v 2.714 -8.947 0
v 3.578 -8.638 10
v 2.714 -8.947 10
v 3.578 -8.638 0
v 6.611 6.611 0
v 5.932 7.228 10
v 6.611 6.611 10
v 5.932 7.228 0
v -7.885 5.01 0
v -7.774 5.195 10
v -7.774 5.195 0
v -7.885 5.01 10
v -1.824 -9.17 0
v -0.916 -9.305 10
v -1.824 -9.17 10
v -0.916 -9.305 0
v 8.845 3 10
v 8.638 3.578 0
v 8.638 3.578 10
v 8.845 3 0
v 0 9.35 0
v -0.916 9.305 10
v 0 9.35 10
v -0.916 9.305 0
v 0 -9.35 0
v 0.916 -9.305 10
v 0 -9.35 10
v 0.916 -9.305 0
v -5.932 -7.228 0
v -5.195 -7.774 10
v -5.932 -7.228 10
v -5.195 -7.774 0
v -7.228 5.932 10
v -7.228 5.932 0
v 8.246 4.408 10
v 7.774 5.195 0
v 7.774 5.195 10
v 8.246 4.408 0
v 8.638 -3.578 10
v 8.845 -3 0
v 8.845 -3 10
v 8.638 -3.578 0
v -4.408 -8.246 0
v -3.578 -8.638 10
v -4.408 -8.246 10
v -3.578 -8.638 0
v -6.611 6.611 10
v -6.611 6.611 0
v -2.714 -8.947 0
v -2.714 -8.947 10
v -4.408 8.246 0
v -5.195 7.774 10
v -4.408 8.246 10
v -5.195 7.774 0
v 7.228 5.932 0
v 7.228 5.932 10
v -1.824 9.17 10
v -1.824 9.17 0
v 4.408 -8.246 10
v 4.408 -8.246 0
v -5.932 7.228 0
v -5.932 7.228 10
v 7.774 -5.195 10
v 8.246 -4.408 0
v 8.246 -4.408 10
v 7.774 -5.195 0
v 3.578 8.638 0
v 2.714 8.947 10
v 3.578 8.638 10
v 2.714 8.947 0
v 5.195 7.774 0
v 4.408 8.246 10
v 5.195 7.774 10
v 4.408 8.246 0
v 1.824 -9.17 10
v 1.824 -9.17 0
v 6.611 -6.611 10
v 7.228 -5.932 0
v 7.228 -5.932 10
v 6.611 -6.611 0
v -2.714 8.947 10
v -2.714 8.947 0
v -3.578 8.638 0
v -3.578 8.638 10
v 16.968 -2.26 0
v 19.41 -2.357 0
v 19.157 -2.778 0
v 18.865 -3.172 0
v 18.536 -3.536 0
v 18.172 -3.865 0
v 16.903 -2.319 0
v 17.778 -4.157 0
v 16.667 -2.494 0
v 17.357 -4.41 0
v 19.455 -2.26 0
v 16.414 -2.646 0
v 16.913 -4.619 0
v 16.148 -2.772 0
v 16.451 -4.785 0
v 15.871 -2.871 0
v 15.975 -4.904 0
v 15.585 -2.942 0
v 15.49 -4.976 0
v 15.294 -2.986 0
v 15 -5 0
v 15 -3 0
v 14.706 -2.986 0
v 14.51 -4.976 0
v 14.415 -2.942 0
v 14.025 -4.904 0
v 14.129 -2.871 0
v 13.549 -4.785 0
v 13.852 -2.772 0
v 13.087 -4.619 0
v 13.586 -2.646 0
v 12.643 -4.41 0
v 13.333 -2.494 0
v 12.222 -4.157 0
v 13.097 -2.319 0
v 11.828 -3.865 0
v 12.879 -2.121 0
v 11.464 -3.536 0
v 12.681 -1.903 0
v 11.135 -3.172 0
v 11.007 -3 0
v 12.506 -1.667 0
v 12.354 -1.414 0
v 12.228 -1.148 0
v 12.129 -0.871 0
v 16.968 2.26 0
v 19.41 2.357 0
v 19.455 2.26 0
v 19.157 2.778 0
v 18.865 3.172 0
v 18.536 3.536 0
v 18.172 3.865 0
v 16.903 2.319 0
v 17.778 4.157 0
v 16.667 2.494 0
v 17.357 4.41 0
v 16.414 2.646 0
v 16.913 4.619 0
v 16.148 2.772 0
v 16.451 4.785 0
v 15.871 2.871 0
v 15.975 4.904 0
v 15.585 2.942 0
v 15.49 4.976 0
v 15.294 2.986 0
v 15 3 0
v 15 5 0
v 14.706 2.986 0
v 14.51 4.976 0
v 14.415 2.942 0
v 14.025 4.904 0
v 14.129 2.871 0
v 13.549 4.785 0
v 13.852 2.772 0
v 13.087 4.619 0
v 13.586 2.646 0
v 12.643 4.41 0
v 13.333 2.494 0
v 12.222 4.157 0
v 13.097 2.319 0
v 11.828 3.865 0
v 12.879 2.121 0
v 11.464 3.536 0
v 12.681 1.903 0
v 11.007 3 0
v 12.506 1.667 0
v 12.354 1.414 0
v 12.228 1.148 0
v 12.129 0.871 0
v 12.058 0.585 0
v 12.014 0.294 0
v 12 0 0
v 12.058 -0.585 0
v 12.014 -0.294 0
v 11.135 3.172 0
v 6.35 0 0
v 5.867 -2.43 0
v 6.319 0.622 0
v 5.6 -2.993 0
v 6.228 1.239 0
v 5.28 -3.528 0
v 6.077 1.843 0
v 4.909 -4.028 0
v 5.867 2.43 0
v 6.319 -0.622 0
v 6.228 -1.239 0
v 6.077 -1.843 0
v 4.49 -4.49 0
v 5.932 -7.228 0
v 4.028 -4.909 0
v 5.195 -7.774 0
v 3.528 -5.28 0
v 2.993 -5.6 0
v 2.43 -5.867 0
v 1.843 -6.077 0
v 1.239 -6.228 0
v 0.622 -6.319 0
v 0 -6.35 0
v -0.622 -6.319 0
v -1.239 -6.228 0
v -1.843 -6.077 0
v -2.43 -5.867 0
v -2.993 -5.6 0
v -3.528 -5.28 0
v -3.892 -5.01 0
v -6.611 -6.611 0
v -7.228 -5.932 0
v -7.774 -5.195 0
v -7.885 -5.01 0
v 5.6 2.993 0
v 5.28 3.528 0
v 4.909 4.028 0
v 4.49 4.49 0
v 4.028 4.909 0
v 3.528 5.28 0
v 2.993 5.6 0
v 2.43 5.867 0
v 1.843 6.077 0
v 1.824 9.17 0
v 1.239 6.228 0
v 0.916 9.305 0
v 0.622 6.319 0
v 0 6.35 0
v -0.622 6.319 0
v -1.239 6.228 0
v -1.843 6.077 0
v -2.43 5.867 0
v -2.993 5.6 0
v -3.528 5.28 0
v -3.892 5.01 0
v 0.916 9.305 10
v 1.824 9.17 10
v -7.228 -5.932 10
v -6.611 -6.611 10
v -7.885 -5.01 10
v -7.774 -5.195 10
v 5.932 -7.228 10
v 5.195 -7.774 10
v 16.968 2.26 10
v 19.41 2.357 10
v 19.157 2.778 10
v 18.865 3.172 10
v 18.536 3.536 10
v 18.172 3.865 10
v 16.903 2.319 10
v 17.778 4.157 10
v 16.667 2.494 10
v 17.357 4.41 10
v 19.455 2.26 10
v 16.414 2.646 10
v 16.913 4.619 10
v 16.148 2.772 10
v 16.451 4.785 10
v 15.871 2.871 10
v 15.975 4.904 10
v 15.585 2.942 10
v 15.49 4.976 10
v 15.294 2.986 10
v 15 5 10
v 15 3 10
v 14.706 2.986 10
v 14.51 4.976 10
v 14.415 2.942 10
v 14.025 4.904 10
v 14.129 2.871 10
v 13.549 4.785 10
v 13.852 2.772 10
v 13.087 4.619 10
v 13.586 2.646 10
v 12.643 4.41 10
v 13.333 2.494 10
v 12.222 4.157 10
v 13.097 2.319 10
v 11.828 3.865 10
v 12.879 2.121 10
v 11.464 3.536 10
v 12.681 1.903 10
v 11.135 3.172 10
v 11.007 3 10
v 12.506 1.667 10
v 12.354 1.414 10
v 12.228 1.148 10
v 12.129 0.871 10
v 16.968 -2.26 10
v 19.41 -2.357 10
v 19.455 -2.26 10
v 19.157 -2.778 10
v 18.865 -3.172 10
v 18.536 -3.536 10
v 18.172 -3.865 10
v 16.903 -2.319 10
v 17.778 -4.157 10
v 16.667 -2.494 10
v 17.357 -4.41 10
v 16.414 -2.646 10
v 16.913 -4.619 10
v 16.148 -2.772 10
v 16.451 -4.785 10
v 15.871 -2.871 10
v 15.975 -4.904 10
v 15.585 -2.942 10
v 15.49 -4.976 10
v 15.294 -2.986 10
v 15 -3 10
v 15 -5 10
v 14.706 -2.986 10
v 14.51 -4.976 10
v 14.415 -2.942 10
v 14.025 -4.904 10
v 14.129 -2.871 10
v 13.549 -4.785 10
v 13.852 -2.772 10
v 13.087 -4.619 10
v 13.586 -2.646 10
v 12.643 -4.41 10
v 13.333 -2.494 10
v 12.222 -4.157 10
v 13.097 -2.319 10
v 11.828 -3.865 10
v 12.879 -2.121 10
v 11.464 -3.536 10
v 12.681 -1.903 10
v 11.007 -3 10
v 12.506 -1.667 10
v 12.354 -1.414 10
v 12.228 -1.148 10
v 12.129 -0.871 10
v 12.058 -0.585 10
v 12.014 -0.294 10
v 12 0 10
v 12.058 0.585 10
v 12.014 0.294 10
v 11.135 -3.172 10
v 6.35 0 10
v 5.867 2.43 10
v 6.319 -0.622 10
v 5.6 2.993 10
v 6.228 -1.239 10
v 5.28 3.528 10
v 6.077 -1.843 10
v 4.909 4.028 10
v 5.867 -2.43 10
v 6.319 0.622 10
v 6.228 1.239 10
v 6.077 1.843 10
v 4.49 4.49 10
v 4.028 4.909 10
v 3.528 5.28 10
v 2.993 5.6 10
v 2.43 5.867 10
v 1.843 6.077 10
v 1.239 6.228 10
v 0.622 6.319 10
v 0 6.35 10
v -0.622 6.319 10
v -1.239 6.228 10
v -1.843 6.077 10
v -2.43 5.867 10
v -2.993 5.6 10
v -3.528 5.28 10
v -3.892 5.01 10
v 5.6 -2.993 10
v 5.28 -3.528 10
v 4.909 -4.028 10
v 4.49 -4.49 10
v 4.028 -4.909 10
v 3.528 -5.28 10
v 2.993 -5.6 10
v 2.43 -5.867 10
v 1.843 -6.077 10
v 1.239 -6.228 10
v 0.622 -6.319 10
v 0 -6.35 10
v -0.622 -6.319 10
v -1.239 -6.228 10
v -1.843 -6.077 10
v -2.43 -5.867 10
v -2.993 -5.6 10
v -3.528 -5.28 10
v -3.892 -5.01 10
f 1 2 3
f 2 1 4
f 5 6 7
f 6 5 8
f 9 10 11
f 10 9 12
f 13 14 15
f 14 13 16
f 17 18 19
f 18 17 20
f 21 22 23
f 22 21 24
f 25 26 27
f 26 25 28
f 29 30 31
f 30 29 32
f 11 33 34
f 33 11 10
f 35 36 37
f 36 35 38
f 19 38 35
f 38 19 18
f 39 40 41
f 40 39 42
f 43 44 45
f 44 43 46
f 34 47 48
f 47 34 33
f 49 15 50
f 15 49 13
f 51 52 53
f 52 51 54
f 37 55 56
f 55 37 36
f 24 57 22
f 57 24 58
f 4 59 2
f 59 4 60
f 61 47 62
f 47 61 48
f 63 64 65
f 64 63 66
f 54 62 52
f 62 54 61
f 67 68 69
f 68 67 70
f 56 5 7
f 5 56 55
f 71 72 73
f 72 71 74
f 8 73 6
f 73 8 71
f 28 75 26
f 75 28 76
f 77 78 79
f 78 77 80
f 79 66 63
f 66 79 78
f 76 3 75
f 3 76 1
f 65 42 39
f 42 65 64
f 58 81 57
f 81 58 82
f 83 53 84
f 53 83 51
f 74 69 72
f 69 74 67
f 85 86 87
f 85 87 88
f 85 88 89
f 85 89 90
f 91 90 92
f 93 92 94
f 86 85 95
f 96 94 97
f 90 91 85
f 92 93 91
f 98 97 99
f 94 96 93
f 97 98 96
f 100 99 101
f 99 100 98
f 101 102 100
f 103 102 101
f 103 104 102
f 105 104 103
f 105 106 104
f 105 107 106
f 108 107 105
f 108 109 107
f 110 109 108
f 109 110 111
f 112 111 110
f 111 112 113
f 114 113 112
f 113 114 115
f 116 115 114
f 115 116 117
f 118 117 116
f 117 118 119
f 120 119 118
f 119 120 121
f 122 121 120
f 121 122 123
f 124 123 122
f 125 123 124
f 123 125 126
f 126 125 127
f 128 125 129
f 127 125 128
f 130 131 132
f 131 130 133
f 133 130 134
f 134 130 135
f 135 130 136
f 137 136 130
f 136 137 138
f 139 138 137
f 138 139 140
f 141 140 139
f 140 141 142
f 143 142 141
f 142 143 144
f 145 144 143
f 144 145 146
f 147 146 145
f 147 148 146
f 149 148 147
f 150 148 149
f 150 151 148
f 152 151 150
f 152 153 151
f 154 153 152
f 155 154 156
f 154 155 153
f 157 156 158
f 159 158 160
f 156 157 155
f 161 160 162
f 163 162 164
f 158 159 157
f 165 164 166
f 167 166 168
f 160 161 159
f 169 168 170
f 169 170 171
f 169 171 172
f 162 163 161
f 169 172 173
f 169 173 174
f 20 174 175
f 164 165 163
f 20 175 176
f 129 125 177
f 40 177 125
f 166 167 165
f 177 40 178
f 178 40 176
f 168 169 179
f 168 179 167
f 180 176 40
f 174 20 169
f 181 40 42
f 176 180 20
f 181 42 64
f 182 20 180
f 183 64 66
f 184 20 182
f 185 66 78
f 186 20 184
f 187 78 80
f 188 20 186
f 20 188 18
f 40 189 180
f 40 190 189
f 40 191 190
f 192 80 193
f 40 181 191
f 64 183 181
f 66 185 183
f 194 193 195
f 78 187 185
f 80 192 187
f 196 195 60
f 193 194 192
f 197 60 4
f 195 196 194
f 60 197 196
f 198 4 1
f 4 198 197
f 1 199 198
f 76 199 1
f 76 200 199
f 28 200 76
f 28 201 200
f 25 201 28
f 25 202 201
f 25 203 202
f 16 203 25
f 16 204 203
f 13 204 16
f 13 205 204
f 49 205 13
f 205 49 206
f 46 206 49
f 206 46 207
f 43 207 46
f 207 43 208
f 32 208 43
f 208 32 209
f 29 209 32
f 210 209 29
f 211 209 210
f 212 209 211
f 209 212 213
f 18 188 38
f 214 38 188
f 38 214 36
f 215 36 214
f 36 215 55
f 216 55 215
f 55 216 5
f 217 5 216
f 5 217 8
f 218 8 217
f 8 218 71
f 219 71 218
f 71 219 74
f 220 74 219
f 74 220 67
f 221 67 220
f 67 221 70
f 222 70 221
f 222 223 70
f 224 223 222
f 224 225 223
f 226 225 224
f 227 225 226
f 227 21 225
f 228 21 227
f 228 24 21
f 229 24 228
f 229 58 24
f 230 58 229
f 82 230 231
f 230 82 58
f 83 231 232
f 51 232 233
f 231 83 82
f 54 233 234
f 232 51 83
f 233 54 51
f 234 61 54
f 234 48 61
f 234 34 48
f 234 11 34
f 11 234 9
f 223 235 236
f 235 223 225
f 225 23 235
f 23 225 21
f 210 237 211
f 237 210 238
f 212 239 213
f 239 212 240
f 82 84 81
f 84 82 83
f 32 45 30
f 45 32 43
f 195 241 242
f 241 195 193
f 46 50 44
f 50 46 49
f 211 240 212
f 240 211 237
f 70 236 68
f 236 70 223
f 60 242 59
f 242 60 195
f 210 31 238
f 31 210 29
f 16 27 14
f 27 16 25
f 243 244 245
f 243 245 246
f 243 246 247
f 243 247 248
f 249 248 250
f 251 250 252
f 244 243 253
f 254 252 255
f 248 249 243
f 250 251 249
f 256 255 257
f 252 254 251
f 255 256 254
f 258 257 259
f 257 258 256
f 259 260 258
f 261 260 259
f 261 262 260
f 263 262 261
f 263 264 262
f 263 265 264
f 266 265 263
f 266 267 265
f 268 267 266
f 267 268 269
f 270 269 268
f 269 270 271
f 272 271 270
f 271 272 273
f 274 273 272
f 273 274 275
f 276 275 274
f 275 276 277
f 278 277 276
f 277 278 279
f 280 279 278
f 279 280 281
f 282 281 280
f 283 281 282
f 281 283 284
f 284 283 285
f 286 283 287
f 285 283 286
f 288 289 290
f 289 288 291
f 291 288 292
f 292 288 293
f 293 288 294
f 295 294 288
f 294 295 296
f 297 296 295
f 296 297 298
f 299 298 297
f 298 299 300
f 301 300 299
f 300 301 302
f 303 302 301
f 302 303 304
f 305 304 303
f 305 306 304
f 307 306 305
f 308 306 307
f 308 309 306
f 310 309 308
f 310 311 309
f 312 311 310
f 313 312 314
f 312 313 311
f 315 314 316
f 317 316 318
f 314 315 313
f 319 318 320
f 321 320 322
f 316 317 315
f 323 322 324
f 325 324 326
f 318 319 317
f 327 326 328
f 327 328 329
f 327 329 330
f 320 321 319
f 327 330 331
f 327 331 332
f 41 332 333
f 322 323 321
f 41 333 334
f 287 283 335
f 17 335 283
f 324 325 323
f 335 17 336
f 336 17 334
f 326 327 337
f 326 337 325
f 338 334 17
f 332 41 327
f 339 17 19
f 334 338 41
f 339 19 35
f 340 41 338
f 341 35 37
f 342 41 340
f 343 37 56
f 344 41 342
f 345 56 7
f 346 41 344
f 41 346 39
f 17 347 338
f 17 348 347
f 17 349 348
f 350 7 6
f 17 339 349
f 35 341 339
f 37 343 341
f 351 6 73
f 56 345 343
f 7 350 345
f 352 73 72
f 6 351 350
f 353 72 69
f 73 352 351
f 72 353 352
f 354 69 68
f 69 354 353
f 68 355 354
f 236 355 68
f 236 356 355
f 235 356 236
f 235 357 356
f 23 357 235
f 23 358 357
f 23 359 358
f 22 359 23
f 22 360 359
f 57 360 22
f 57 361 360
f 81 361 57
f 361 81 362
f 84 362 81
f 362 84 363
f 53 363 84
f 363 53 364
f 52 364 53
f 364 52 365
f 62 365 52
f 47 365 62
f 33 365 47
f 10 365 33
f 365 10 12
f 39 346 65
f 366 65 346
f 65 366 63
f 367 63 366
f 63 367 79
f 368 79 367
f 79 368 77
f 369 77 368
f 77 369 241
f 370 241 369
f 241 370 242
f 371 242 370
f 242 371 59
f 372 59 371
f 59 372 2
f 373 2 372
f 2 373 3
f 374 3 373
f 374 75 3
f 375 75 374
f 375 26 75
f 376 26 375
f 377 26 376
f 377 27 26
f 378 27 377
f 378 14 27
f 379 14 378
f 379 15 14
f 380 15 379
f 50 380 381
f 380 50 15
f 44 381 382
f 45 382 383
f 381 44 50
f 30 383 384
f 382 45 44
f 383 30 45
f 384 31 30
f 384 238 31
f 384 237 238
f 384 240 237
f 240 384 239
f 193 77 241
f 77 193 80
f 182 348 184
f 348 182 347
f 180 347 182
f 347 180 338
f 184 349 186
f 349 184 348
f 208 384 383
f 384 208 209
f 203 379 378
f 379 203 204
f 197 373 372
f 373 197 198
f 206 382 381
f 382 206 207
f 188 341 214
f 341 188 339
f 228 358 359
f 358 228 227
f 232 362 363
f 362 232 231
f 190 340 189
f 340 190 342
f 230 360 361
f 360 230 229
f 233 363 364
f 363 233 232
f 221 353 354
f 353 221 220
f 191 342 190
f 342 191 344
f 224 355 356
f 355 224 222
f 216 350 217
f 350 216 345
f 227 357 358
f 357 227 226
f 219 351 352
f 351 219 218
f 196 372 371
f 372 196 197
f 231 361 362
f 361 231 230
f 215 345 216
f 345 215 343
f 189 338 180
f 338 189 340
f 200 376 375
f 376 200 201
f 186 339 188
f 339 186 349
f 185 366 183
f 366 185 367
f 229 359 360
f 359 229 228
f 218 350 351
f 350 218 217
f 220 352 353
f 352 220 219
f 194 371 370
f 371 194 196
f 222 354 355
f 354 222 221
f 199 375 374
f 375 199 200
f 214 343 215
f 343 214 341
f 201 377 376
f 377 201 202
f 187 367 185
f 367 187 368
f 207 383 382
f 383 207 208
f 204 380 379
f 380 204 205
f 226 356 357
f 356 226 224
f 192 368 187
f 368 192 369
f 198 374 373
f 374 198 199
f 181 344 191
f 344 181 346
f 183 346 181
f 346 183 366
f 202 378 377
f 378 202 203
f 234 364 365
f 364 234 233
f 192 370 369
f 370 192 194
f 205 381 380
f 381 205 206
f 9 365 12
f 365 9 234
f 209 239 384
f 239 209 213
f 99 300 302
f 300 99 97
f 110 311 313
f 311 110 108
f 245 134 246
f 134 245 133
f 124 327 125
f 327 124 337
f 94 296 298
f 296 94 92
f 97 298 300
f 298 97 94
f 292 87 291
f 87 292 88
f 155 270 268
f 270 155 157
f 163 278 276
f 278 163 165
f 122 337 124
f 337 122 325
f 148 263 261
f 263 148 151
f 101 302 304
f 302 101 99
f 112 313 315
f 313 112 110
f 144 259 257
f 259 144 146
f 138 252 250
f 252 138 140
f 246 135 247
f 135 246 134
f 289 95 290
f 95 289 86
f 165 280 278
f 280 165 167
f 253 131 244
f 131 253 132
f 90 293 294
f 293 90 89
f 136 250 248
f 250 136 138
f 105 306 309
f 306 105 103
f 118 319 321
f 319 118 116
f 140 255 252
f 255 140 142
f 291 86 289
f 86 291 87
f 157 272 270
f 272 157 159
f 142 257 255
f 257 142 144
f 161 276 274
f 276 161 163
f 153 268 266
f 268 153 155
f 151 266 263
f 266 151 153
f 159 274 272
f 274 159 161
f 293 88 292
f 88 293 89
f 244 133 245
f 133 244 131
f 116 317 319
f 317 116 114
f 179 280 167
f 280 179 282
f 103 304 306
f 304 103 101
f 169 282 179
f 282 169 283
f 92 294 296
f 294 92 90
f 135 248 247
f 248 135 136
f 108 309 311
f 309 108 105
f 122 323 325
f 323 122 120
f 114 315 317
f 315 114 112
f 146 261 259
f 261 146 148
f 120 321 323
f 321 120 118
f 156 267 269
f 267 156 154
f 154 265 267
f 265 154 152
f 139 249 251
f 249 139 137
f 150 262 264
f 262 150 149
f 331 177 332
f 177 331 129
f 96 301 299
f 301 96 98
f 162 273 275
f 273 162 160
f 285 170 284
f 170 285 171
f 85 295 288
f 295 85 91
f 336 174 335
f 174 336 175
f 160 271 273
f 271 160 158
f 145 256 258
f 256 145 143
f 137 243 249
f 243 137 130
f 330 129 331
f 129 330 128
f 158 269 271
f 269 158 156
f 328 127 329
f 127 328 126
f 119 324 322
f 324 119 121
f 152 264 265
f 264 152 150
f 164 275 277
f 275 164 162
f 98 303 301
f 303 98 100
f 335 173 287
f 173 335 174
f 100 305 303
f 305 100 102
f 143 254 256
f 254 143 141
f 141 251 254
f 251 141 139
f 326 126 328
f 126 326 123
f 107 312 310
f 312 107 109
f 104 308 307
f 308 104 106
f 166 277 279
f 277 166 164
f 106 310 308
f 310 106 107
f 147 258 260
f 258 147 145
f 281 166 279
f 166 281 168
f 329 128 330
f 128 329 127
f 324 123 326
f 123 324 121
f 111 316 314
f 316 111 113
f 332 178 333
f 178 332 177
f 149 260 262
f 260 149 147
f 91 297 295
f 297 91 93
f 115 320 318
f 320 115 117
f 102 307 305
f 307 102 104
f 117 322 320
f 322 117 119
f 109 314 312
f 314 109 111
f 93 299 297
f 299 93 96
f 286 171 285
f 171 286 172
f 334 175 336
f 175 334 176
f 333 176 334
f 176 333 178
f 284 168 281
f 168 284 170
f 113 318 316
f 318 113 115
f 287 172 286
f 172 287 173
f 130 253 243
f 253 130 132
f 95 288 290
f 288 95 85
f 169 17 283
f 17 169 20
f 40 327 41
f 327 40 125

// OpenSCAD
$fn = 64;

// Dimensions
rod_id = 12.7;        // inner diameter of rod ring (mm)
rod_wall = 3;         // wall thickness of rod ring (mm)
rod_od = rod_id + 2 * rod_wall;  // outer diameter of rod ring (mm)
tubing_id = 6;        // inner diameter of tubing ring (mm)
tubing_wall = 2;      // wall thickness of tubing ring (mm)
tubing_od = tubing_id + 2 * tubing_wall;  // outer diameter of tubing ring (mm)
clip_height = 10;     // height of the entire clip (Z)

// Opening dimensions
rod_opening_half_width = 5;   // half of 10 mm opening (mm)
tubing_opening_half_width = 2.25; // half of 4.5 mm opening (mm)

// Calculate centers
rod_center_x = 0;
rod_center_y = 0;
tubing_center_x = 15;
tubing_center_y = 0;

// Bridge parameters
bridge_width = 6;     // width of bridge in Y-direction (mm)
bridge_x_start = 8;   // start x-coordinate of bridge
bridge_x_end = 12;    // end x-coordinate of bridge

// Rod ring with opening (starting at z=0)
module rod_ring_with_opening() {
    difference() {
        // Outer cylinder (from z=0 to z=clip_height)
        cylinder(h = clip_height, d = rod_od);
        // Inner cylinder (hole)
        translate([0, 0, -0.01])
            cylinder(h = clip_height + 0.02, d = rod_id);
        // Opening cut: remove x < 0 and -5 < y < 5
        translate([-100, -rod_opening_half_width - 0.01, -0.01])
            cube([100, 2 * rod_opening_half_width + 0.02, clip_height + 0.02]);
    }
}

// Tubing ring with opening (starting at z=0)
module tubing_ring_with_opening() {
    difference() {
        // Outer cylinder (from z=0 to z=clip_height)
        translate([tubing_center_x, tubing_center_y, 0])
            cylinder(h = clip_height, d = tubing_od);
        // Inner cylinder (hole)
        translate([tubing_center_x, tubing_center_y, -0.01])
            cylinder(h = clip_height + 0.02, d = tubing_id);
        // Opening cut: remove x > 15 and -2.25 < y < 2.25
        translate([15 + 0.01, -tubing_opening_half_width - 0.01, -0.01])
            cube([100, 2 * tubing_opening_half_width + 0.02, clip_height + 0.02]);
    }
}

// Bridge between rings (from z=0 to z=clip_height)
module bridge() {
    y_start = -bridge_width / 2;
    y_end = bridge_width / 2;
    
    translate([bridge_x_start, y_start, 0])
        cube([bridge_x_end - bridge_x_start, bridge_width, clip_height]);
}

// Assemble the clip
module clip() {
    union() {
        rod_ring_with_opening();
        tubing_ring_with_opening();
        bridge();
    }
}

clip();
